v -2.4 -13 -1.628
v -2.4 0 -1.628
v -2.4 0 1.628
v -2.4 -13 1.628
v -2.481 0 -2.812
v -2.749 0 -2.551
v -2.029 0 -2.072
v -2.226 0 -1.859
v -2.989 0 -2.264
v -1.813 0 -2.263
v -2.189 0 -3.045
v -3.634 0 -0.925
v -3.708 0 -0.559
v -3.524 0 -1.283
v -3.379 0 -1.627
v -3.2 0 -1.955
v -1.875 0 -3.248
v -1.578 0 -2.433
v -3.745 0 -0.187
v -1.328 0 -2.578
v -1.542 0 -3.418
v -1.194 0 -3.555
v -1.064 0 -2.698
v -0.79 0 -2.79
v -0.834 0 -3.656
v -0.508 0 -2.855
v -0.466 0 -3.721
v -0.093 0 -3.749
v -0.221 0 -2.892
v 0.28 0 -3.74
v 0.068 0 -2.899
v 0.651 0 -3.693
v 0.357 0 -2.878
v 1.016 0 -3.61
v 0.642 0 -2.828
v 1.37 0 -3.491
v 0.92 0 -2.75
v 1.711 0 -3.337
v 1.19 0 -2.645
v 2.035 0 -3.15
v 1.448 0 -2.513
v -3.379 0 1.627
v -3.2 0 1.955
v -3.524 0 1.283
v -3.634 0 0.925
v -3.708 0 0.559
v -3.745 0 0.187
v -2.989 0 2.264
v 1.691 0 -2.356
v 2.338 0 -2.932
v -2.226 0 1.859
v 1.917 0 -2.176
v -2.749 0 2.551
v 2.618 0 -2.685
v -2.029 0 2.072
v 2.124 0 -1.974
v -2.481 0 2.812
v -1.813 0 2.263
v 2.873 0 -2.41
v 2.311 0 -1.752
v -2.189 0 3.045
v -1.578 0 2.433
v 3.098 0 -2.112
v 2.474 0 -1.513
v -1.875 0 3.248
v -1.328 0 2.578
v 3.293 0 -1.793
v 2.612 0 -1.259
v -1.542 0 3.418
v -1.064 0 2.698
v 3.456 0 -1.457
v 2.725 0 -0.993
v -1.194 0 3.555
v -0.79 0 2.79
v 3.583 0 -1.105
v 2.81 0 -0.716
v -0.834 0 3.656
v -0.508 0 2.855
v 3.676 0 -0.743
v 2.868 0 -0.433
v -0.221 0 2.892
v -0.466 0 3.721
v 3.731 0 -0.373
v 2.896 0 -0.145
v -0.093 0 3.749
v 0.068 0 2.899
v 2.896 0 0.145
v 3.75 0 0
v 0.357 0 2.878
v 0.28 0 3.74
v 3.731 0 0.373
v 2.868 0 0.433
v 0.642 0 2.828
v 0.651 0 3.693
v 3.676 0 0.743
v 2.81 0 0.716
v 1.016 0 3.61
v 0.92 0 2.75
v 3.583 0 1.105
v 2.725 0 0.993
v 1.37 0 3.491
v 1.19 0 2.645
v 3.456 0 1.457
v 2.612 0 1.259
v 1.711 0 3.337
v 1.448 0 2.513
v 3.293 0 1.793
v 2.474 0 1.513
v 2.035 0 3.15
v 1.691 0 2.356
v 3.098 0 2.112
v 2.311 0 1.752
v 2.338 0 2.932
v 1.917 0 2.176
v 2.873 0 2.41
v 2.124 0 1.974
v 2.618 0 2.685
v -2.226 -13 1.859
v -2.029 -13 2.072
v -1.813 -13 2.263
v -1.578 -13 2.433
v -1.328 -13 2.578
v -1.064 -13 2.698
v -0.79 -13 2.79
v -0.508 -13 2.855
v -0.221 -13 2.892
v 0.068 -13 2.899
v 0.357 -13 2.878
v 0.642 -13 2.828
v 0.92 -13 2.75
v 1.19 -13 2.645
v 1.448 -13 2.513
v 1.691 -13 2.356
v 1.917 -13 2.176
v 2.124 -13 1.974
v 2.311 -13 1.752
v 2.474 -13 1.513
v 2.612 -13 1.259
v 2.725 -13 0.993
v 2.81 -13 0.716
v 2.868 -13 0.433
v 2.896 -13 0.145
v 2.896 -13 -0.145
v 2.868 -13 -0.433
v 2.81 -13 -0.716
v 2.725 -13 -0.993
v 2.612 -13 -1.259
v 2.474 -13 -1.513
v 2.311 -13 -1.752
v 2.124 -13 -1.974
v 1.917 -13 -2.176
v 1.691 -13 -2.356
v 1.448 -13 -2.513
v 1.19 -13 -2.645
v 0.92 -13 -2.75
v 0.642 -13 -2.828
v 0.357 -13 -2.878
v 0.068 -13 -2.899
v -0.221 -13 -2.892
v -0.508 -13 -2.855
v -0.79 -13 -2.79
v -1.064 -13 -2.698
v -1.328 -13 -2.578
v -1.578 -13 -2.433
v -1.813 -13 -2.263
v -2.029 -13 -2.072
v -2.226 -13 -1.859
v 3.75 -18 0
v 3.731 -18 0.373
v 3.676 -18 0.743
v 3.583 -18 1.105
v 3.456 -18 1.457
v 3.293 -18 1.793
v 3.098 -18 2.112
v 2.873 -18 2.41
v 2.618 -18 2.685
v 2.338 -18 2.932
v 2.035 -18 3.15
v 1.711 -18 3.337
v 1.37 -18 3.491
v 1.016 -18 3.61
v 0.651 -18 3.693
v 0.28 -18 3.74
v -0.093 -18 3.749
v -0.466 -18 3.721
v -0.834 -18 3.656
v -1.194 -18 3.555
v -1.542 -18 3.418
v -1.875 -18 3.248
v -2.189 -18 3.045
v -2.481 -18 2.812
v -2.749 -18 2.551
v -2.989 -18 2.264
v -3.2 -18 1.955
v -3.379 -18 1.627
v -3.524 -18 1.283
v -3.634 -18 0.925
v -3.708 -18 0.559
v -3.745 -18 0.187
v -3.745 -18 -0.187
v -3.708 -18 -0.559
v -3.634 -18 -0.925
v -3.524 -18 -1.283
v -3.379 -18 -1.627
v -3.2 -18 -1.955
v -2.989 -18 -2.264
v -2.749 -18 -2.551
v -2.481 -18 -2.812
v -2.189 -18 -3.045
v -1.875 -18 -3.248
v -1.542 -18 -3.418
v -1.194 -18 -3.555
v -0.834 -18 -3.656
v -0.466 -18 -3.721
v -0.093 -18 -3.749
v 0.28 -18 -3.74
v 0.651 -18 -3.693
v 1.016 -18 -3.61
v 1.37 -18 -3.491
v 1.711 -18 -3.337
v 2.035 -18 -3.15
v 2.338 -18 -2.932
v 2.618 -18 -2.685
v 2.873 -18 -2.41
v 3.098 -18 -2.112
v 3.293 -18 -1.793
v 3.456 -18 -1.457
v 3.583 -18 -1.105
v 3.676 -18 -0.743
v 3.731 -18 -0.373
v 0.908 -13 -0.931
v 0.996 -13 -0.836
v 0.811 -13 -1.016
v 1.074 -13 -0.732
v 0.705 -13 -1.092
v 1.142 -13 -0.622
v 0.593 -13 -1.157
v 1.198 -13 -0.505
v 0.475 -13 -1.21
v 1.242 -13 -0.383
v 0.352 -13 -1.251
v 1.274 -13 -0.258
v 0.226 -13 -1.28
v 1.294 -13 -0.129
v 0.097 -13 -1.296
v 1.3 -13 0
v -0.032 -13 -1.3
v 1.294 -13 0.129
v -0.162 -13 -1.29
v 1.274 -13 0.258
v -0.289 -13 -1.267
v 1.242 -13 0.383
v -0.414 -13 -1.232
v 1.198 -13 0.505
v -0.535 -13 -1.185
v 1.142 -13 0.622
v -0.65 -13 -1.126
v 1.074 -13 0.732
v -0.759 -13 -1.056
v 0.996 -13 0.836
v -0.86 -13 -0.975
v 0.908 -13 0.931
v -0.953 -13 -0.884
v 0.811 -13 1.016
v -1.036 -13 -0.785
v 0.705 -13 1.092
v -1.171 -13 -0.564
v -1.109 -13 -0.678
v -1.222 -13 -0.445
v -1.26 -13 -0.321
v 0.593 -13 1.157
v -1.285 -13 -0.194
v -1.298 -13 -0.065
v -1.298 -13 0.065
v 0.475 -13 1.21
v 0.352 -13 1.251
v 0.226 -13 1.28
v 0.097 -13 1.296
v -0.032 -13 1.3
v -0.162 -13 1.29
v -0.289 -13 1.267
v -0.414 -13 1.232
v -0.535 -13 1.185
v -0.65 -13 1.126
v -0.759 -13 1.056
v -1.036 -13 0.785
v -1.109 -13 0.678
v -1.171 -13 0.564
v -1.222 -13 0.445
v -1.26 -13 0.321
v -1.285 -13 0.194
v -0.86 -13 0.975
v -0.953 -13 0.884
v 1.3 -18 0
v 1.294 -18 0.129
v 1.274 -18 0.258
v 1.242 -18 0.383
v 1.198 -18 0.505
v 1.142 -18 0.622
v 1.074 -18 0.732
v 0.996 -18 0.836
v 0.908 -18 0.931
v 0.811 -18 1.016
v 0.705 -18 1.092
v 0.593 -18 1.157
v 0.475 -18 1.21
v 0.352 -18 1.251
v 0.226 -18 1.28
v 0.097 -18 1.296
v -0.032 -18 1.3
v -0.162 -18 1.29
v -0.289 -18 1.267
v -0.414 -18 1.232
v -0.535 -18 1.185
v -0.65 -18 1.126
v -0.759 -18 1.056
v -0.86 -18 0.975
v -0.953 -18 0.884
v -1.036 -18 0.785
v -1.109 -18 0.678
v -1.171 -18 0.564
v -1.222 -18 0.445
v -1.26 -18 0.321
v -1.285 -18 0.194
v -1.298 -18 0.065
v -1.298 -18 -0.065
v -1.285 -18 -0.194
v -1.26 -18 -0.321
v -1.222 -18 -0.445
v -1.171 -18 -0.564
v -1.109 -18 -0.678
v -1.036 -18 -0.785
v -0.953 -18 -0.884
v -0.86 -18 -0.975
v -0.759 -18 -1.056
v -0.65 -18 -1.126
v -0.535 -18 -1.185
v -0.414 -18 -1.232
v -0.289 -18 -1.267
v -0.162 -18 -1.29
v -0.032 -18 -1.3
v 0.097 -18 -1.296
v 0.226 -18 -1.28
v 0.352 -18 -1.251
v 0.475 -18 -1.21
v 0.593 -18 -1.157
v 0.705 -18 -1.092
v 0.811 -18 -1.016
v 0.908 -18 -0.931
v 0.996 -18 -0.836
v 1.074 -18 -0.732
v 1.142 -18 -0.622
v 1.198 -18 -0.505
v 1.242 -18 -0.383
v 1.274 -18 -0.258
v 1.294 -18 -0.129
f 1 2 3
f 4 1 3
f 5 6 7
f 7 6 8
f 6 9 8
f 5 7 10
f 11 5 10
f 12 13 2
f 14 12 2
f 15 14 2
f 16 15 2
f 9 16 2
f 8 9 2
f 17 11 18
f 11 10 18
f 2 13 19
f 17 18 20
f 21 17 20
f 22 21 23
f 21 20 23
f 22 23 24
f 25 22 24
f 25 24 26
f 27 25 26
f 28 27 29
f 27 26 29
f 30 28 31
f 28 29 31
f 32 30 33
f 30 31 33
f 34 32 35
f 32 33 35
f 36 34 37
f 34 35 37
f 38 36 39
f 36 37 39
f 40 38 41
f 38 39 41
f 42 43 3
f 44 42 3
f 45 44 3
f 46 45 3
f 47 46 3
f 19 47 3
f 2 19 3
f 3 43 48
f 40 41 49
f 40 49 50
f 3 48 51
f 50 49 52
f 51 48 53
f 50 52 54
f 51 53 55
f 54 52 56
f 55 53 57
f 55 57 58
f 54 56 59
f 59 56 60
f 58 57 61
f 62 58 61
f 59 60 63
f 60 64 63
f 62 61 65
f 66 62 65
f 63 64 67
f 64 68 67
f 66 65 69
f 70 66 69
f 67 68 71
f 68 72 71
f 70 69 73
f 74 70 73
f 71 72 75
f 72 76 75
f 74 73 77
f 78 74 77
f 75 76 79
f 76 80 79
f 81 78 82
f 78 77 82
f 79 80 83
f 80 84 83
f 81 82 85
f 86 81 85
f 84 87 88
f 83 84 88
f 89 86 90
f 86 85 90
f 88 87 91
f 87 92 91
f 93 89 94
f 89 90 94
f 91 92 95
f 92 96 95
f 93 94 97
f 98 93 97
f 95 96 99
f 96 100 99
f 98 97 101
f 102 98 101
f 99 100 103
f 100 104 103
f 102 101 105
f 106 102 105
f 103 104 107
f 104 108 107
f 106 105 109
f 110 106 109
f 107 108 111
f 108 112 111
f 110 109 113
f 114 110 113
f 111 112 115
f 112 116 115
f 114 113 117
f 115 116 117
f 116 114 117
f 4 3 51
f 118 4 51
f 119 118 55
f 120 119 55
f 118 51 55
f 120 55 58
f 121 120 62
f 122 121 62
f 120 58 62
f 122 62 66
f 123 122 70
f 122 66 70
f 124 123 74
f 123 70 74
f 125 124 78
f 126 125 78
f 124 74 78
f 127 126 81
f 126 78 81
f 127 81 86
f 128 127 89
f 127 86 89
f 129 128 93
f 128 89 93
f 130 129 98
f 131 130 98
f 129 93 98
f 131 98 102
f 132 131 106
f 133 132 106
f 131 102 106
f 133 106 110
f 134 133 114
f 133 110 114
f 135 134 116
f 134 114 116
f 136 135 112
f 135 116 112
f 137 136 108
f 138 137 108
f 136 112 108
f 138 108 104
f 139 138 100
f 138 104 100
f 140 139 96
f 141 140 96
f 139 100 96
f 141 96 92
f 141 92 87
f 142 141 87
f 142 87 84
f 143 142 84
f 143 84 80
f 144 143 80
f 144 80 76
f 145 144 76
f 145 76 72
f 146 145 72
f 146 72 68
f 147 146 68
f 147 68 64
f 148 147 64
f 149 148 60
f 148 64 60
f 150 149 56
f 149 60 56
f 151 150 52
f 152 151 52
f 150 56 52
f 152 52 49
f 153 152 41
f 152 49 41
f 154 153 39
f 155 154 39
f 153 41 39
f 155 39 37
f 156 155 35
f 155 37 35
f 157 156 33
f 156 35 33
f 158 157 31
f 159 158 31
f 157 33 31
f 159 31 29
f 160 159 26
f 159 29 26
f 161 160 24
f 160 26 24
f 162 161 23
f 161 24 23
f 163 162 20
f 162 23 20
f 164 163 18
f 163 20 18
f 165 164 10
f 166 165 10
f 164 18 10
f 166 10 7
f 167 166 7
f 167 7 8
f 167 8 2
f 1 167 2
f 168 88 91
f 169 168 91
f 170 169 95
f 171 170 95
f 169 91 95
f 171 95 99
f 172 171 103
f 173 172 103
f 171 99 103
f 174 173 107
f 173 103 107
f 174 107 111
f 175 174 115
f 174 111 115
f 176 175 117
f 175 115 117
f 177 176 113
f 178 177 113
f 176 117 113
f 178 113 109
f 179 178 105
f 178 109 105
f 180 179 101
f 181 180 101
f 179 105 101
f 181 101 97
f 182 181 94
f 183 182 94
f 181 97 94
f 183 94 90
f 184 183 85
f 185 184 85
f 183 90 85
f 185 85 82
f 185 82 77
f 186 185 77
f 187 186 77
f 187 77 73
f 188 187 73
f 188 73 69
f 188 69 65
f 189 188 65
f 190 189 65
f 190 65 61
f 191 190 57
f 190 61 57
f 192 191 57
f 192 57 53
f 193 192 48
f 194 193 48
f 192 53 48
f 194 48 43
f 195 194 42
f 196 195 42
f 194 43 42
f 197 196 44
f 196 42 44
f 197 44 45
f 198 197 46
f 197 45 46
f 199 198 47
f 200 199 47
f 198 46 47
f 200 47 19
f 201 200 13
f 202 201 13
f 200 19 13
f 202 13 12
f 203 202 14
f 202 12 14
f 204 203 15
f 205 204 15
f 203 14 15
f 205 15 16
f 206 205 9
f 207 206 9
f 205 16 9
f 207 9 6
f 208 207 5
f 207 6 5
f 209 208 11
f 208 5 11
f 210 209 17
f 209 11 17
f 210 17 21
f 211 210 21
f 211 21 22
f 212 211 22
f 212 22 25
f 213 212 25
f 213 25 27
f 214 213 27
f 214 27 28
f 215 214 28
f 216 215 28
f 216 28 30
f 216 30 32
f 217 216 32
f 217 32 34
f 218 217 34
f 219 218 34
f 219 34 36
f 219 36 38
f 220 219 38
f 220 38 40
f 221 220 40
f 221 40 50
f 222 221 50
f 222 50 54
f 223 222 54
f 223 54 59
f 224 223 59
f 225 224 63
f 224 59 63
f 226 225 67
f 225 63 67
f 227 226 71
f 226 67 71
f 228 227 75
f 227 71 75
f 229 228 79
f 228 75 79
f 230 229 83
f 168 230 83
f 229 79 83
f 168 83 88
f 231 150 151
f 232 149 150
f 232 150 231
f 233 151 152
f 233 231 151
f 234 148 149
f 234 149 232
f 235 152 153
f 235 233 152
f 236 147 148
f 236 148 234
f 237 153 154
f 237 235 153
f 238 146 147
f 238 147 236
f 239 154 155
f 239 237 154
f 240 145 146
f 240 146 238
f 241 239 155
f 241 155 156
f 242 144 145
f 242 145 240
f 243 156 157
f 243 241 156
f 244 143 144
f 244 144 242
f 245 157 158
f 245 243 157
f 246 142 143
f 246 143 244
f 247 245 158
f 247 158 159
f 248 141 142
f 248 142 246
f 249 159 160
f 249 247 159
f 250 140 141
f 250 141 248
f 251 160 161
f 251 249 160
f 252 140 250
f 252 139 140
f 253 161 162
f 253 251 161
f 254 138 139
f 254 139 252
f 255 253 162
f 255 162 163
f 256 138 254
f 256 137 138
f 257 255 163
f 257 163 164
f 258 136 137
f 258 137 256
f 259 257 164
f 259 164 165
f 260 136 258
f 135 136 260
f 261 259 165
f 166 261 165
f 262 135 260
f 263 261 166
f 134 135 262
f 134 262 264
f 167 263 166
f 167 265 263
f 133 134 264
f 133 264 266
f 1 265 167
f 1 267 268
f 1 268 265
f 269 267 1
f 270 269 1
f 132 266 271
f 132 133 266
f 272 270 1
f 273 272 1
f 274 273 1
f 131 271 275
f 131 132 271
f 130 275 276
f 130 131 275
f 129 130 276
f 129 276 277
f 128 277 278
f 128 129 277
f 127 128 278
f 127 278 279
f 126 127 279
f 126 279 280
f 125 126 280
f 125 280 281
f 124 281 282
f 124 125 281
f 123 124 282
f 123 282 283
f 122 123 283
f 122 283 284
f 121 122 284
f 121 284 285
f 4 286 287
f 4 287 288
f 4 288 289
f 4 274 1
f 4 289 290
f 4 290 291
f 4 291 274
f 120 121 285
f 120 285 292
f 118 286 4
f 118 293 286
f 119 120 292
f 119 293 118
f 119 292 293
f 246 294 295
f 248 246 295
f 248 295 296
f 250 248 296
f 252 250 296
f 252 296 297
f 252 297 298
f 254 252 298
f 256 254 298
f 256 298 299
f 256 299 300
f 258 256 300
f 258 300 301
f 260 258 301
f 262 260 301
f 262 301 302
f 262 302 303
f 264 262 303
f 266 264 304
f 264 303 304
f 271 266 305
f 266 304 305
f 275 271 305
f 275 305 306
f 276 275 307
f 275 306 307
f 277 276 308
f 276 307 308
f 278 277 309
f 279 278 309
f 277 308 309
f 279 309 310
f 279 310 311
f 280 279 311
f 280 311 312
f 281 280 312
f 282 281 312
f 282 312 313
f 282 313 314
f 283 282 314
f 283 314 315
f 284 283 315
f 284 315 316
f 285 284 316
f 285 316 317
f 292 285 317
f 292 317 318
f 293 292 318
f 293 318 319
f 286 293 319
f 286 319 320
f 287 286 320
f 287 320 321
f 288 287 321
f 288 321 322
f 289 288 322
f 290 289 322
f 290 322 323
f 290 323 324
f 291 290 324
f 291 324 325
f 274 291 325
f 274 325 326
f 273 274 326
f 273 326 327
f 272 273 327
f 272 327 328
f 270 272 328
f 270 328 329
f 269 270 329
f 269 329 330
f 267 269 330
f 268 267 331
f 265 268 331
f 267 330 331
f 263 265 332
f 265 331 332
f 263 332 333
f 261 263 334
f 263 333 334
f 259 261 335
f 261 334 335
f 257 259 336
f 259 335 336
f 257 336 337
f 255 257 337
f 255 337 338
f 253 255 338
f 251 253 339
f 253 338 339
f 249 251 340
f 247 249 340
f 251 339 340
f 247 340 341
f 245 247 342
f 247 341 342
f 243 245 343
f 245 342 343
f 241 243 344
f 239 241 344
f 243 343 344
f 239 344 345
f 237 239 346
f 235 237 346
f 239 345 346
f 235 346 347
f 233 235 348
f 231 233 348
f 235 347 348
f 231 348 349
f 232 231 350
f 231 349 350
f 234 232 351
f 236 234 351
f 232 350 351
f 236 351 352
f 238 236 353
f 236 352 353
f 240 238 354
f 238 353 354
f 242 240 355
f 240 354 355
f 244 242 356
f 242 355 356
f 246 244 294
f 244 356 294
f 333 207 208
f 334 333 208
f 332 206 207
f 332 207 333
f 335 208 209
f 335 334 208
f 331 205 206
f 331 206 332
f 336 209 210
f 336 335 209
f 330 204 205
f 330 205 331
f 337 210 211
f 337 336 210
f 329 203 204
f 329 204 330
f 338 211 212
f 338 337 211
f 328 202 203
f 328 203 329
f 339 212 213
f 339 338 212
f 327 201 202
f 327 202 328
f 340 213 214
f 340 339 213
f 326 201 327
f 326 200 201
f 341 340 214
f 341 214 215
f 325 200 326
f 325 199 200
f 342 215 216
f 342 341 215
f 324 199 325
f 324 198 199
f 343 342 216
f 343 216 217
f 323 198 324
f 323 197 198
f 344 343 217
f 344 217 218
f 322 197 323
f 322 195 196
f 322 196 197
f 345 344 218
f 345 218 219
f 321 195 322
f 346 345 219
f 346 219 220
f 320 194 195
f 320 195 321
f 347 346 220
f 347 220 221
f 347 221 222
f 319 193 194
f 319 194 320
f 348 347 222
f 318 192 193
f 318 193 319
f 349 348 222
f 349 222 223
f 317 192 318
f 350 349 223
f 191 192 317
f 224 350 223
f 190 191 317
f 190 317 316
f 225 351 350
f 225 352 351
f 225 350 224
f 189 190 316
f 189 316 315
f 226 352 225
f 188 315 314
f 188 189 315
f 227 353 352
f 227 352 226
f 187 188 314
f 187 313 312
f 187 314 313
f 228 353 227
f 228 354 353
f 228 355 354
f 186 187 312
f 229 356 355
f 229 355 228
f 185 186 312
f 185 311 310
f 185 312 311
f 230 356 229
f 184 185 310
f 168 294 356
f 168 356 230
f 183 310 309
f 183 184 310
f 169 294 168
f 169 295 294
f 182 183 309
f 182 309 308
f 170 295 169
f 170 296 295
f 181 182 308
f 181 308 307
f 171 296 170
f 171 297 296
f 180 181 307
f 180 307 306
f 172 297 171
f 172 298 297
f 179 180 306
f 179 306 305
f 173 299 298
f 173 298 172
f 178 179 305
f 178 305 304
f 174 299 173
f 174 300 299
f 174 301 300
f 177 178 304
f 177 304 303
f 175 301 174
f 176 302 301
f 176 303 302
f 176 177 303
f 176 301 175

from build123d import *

# Parameters (mm, degrees)
F0_R     = 3.75
F1_DEPTH = 18
F3_DEPTH = 13
F4_R     = 1.3
F5_DEPTH = 18.001


with BuildPart() as f1:
    # F0 (on Front) → F1 (new body)
    with BuildSketch(Plane.XZ):
        Circle(F0_R)
    extrude(amount=F1_DEPTH)

    # F2 (on face) → F3 (cut, through all)
    with BuildSketch(Plane(origin=(0, 0, 0), x_dir=(-1, 0, 0), z_dir=(0, 1, 0))):
        with BuildLine():
            Line((2.4, -1.6278820596), (2.4, 1.6278820596))
            ThreePointArc((2.4, 1.6278820596), (-2.9, 0), (2.4, -1.6278820596))
        make_face()
    extrude(amount=-F3_DEPTH, mode=Mode.SUBTRACT)

    # F4 (on face) → F5 (cut, through all)
    with BuildSketch(Plane.XZ.offset(18)):
        Circle(F4_R)
    extrude(amount=-F5_DEPTH, mode=Mode.SUBTRACT)


solid = f1.part
